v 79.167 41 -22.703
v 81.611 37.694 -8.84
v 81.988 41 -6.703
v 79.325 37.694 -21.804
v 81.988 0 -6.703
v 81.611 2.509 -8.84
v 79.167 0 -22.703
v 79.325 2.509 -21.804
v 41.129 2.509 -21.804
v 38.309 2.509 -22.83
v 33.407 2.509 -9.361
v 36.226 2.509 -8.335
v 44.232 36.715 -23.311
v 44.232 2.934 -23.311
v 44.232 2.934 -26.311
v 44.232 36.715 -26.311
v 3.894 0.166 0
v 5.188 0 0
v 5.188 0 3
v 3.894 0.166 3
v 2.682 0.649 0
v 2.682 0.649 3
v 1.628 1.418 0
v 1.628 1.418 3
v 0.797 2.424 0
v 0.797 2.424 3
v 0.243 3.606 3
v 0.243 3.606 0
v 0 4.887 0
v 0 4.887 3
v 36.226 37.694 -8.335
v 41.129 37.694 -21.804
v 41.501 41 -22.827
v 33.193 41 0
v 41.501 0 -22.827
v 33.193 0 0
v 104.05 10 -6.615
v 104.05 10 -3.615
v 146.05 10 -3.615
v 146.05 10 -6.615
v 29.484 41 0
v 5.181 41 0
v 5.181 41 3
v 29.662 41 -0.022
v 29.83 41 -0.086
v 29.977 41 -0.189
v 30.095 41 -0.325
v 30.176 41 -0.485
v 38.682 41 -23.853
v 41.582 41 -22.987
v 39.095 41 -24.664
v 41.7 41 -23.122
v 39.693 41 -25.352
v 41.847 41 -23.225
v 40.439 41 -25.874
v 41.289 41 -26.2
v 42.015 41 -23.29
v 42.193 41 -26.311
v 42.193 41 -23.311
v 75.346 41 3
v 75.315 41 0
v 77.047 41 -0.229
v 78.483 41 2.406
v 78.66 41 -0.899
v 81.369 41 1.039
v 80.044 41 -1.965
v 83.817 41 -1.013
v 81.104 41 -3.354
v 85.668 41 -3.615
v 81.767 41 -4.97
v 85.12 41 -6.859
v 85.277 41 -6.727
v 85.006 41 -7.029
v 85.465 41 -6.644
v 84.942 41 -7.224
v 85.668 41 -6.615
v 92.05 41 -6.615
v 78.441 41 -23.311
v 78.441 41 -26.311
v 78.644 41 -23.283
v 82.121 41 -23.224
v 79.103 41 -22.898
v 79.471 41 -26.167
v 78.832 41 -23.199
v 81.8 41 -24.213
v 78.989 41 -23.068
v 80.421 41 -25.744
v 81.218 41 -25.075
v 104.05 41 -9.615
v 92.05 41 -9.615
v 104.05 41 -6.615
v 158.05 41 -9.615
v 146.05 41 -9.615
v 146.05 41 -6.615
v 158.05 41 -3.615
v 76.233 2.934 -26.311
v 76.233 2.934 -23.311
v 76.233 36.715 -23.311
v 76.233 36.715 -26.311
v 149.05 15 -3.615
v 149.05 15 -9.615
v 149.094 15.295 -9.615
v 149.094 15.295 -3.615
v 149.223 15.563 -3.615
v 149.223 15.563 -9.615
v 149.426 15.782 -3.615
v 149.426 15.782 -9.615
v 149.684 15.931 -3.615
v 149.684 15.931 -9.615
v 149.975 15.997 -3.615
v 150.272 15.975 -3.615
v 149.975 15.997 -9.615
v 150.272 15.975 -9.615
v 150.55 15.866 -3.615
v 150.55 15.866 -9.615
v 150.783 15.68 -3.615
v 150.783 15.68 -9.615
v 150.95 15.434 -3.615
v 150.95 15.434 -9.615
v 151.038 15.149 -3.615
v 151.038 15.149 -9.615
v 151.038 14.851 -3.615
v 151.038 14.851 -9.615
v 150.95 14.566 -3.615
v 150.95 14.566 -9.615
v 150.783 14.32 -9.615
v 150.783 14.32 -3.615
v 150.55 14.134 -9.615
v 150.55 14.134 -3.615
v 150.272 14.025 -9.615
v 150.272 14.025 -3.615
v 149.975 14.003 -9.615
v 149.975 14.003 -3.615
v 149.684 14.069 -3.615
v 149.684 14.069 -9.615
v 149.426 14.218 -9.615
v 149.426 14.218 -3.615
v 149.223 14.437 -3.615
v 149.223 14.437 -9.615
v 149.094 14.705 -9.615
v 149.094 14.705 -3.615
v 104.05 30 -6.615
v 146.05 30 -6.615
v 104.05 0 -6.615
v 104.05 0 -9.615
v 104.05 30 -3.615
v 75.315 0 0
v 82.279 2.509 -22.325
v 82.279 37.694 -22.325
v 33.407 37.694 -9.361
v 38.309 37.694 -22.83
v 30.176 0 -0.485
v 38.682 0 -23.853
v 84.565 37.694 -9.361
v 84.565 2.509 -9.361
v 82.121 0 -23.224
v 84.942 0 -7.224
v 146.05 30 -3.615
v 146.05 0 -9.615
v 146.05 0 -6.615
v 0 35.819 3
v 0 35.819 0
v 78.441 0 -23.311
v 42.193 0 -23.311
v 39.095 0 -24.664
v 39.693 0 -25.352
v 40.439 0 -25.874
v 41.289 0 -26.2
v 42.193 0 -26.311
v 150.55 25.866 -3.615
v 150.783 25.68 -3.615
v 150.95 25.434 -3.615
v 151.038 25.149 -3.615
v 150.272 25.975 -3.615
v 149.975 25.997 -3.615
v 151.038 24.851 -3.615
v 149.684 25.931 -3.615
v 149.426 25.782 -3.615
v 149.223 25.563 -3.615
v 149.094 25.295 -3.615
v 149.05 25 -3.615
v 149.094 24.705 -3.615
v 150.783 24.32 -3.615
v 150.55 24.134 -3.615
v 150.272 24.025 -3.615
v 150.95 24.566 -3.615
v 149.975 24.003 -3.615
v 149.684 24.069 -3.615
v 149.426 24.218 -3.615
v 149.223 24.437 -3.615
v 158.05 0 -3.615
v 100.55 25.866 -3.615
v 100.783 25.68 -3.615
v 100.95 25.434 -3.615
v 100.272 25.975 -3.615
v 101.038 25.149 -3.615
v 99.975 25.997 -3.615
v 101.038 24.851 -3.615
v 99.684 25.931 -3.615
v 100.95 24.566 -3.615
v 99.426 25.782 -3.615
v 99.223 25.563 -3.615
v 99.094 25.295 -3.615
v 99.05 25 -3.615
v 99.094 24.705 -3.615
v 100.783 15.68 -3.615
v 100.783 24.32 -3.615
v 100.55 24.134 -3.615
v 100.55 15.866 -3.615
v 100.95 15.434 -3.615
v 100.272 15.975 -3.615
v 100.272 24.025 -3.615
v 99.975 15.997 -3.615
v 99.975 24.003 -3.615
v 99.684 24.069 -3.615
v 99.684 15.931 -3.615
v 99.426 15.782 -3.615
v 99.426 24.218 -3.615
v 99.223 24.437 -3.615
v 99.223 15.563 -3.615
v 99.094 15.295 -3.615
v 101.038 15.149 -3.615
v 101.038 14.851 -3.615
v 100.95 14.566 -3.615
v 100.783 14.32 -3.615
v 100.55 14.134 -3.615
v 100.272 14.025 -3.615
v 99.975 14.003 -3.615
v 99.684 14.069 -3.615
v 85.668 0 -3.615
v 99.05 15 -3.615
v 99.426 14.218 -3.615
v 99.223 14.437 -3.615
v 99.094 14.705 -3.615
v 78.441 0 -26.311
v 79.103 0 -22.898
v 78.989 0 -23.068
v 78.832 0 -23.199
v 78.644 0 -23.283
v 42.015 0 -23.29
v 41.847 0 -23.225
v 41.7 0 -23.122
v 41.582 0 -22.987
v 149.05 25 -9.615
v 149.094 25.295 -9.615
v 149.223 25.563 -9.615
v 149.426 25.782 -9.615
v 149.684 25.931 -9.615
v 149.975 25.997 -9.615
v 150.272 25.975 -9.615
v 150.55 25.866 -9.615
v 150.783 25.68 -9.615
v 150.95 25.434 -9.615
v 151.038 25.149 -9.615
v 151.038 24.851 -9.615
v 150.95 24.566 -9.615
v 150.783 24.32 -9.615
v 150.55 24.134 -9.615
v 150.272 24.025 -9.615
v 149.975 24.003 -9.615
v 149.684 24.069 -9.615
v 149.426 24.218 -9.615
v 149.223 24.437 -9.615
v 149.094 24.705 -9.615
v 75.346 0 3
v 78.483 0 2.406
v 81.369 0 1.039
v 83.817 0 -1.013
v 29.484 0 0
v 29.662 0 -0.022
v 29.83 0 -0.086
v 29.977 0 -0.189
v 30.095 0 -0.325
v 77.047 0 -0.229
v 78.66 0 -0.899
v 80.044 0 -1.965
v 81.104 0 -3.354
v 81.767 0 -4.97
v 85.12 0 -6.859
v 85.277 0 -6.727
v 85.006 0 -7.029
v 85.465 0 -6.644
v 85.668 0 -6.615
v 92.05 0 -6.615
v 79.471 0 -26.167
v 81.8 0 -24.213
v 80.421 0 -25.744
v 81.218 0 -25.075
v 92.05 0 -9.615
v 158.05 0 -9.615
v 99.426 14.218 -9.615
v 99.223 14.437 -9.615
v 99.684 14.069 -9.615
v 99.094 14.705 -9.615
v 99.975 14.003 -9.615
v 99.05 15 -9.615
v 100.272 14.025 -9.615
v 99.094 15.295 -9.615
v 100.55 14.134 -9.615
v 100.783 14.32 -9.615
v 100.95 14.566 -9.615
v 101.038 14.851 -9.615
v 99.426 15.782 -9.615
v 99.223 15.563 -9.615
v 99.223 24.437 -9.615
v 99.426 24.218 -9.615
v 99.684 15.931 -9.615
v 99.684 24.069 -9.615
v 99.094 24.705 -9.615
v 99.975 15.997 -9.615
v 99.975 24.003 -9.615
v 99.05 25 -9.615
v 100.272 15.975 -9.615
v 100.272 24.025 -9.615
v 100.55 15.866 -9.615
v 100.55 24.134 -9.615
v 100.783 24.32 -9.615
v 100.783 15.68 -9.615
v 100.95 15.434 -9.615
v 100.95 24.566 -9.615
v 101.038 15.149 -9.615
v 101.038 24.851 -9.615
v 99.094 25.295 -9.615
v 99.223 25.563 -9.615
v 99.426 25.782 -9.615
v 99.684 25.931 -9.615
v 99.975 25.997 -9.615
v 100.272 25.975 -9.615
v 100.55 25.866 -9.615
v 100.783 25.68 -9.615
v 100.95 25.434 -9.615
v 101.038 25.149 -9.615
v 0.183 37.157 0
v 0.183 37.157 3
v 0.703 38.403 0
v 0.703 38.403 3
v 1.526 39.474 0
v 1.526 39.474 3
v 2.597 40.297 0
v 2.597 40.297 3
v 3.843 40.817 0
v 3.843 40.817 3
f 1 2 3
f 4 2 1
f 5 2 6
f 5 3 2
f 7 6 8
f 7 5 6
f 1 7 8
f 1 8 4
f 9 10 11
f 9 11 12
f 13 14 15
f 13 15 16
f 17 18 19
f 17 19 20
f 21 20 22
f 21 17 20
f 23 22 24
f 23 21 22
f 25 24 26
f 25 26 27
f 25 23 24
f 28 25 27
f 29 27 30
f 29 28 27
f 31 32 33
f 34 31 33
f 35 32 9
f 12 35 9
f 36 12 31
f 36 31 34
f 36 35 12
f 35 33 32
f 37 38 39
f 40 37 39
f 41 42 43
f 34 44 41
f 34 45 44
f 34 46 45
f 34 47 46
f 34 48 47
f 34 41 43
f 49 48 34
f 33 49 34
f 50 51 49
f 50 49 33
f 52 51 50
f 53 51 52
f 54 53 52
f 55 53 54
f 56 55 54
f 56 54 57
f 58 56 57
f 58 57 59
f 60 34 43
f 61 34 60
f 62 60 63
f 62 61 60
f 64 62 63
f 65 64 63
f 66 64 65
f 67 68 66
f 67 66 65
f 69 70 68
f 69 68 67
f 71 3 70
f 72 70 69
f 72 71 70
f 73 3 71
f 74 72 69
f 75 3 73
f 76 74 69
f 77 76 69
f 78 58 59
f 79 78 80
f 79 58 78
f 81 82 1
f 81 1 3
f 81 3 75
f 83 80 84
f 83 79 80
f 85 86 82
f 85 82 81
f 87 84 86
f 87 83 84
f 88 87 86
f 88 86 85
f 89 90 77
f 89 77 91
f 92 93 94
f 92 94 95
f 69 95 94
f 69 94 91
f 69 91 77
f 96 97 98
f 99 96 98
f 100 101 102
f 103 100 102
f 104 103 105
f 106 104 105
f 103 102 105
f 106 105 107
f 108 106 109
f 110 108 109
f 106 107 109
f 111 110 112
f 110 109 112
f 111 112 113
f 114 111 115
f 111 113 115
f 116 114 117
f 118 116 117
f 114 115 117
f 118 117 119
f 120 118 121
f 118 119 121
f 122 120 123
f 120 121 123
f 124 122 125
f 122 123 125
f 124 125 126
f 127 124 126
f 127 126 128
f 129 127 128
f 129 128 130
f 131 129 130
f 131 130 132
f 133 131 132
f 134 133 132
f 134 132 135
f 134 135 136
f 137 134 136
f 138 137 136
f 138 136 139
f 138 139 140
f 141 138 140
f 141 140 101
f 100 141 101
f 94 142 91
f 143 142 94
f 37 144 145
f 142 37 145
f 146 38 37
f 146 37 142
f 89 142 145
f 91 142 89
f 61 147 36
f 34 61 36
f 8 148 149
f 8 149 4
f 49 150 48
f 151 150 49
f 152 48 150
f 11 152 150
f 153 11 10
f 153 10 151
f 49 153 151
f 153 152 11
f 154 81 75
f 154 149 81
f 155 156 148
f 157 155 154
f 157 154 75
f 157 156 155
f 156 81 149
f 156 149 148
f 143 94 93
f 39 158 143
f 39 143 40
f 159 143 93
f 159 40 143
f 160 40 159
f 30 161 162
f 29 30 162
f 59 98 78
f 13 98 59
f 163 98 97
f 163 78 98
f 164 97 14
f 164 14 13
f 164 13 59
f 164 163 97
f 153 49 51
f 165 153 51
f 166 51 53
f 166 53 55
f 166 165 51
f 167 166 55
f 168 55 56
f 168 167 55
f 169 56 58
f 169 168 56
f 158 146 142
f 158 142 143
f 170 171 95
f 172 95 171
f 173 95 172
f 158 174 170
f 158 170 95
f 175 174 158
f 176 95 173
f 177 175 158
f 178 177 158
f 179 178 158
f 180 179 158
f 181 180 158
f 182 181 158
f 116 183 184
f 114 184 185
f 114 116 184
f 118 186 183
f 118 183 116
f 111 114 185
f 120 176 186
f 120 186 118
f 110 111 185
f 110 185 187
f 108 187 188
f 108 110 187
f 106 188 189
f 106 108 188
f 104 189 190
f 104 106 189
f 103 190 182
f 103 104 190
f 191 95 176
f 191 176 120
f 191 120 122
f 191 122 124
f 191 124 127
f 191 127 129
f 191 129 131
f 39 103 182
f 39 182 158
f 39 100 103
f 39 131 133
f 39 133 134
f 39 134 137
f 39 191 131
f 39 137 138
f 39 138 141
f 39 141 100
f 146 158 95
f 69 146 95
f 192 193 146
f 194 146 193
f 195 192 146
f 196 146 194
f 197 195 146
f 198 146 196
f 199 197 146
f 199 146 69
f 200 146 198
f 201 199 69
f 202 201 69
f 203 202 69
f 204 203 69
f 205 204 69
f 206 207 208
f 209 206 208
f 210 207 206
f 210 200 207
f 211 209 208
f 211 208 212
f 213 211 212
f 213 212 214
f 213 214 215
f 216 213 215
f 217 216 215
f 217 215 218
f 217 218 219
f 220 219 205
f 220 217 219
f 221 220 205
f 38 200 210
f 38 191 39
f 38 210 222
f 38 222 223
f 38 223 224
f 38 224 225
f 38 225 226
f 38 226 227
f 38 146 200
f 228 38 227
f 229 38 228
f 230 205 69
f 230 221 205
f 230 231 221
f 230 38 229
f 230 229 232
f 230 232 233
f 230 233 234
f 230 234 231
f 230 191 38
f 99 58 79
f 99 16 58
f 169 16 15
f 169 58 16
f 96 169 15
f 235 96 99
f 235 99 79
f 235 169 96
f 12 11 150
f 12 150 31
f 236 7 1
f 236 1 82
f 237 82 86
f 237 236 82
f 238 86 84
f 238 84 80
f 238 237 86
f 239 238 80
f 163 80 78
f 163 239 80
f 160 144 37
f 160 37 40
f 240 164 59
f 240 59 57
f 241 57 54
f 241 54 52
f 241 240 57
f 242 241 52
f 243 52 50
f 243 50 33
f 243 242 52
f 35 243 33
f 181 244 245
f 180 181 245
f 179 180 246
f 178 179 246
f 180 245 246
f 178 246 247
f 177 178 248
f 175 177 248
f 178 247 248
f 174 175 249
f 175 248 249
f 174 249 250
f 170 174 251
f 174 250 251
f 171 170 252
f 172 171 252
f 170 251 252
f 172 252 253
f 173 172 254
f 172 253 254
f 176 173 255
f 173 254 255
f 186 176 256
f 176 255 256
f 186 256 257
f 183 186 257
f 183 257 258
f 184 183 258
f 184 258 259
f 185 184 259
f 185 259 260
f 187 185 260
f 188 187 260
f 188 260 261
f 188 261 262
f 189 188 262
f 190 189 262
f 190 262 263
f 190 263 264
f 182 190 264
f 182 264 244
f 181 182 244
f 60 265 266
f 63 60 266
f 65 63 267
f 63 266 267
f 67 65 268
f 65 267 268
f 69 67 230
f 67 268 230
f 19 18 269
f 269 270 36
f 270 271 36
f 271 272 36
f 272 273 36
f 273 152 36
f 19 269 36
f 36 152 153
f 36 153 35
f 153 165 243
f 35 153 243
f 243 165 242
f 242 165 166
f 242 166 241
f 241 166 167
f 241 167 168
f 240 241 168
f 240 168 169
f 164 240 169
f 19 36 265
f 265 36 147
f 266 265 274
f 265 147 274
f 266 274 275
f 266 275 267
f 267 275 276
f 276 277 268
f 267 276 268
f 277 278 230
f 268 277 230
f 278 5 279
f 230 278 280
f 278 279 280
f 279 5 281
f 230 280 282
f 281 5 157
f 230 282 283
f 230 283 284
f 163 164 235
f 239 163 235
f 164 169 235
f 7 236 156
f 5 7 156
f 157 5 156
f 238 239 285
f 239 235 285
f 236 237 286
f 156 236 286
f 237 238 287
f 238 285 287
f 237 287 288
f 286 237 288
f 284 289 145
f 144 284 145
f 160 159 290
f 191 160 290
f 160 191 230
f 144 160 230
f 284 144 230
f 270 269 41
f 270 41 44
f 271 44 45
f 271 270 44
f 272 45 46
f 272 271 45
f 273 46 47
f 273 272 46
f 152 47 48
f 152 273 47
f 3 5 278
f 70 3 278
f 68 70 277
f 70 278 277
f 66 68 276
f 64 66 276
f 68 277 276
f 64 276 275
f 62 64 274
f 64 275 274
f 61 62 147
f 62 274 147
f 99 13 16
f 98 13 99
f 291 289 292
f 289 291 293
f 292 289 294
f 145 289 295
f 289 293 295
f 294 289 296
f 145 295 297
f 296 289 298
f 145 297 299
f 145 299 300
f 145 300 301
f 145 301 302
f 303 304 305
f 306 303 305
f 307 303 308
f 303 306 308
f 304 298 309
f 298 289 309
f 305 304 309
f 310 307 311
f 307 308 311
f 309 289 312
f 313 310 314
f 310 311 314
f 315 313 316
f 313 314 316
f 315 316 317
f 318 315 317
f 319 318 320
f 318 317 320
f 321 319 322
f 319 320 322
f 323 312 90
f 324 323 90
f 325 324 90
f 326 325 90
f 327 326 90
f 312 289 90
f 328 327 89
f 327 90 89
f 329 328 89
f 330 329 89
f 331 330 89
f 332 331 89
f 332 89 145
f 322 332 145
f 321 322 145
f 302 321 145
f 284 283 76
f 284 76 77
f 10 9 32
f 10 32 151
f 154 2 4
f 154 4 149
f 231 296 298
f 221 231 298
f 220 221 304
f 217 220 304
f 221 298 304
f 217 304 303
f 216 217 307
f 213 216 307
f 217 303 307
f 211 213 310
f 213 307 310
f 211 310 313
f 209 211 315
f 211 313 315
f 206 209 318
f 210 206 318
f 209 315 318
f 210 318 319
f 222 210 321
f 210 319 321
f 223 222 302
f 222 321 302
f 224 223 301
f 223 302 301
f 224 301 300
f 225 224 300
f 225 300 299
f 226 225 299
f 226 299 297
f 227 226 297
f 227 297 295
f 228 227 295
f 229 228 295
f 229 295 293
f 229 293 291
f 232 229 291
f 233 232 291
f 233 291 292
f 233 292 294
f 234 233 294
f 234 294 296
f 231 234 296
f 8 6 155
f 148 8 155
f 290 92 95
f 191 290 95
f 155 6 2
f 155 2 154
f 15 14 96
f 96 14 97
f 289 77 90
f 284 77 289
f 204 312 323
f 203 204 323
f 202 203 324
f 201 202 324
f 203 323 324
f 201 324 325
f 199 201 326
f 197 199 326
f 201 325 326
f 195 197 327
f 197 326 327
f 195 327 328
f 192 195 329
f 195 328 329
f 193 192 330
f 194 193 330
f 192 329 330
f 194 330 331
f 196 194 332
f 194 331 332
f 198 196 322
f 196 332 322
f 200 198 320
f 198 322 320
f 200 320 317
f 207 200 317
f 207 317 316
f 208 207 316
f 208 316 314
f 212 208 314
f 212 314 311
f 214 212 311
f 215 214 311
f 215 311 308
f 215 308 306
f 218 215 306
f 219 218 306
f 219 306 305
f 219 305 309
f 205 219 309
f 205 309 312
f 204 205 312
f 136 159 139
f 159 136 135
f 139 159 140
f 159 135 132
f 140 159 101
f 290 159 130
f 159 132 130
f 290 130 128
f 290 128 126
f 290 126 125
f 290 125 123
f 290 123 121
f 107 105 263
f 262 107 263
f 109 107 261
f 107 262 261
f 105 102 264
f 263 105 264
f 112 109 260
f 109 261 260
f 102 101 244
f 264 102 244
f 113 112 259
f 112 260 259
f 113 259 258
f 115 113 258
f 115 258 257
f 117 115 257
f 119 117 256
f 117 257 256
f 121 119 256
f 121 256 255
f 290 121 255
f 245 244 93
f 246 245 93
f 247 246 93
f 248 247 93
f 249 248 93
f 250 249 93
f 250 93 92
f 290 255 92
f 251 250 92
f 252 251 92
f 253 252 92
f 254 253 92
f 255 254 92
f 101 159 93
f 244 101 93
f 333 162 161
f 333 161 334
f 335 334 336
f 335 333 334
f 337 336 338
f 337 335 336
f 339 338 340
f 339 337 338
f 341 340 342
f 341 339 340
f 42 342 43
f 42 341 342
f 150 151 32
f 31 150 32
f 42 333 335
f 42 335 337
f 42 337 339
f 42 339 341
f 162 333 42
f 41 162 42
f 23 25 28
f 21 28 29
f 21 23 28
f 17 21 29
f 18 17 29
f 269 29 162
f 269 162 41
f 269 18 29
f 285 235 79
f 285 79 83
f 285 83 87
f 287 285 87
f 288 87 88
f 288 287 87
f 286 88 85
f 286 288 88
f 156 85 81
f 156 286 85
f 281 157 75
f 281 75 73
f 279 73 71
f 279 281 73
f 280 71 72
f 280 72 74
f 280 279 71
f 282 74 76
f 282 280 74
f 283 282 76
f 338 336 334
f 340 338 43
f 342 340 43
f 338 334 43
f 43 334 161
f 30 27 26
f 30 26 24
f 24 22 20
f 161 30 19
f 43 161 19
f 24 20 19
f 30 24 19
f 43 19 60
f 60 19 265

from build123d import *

# Parameters (mm, degrees)
BASE_FLANGE1_DEPTH  = 41
SKETCH2_W           = 42
SKETCH2_H           = 20
CUT_EXTRUDE1_DEPTH  = 10
BOSS_EXTRUDE1_DEPTH = 6
SKETCH5_R           = 1
CUT_EXTRUDE3_DEPTH  = 165.132308696
BOSS_EXTRUDE2_DEPTH = 41
SKETCH7_W           = 32.001348433
SKETCH7_H           = 33.78132576
CUT_EXTRUDE4_DEPTH  = 7
CUT_EXTRUDE5_START  = 2.509016302
CUT_EXTRUDE5_DEPTH  = 35.18539121
CUT_EXTRUDE6_START  = -3
CUT_EXTRUDE6_DEPTH  = 3


# Read off the part's stored shape, not the designer's step: Cut-Extrude5, Cut-Extrude6
# Sheet-metal steps are written as plain solids
with BuildPart() as part:
    # Sketch1 → Base-Flange1 (new body)
    with BuildSketch(Plane(origin=(0, 0, 0), x_dir=(1, 0, 0), z_dir=(0, 1, 0))):
        with BuildLine():
            Line((0, 0), (29.484227127, 0))
            ThreePointArc((29.484227127, 0), (29.90672353, 0.133212604), (30.176404712, 0.484667962))
            Line((30.176404712, 0.484667962), (38.681704054, 23.85278585))
            ThreePointArc((38.681704054, 23.85278585), (40.049733788, 25.635636911), (42.1929595, 26.311393382))
            Line((42.1929595, 26.311393382), (78.441184331, 26.311393382))
            ThreePointArc((78.441184331, 26.311393382), (80.843024514, 25.437195048), (82.121016981, 23.223647163))
            Line((82.121016981, 23.223647163), (84.942198964, 7.223929074))
            ThreePointArc((84.942198964, 7.223929074), (85.194131001, 6.787569985), (85.667608355, 6.615238322))
            Line((85.667608355, 6.615238322), (158.049527566, 6.615238322))
            Line((158.049527566, 6.615238322), (158.049527566, 3.615238322))
            Line((158.049527566, 3.615238322), (85.667608355, 3.615238322))
            ThreePointArc((85.667608355, 3.615238322), (83.265768172, 4.489436656), (81.987775705, 6.702984541))
            Line((81.987775705, 6.702984541), (79.166593722, 22.70270263))
            ThreePointArc((79.166593722, 22.70270263), (78.914661685, 23.139061719), (78.441184331, 23.311393382))
            Line((78.441184331, 23.311393382), (42.1929595, 23.311393382))
            ThreePointArc((42.1929595, 23.311393382), (41.770463097, 23.178180778), (41.500781916, 22.82672542))
            Line((41.500781916, 22.82672542), (32.995482574, -0.541392468))
            ThreePointArc((32.995482574, -0.541392468), (31.627452839, -2.324243529), (29.484227127, -3))
            Line((29.484227127, -3), (0, -3))
            Line((0, -3), (0, 0))
        make_face()
    extrude(amount=BASE_FLANGE1_DEPTH)

    # Sketch2 → Cut-Extrude1 (cut)
    with BuildSketch(Plane.XY.offset(-3.615238322)):
        with Locations((125.049527566, 20)):
            Rectangle(SKETCH2_W, SKETCH2_H)
    extrude(amount=-CUT_EXTRUDE1_DEPTH, mode=Mode.SUBTRACT)

    # Sketch3 → Boss-Extrude1 (add)
    with BuildSketch(Plane.XY.offset(-3.615238322)):
        Polygon((104.049527566, 30), (104.049527566, 41), (92.049527566, 41), (92.049527566, 0), (104.049527566, 0), (104.049527566, 10), align=None)
        Polygon((158.049527566, 0), (158.049527566, 41), (146.049527566, 41), (146.049527566, 30), (146.049527566, 10), (146.049527566, 0), align=None)
    extrude(amount=-BOSS_EXTRUDE1_DEPTH)

    # Sketch5 → Cut-Extrude3 (cut, through all)
    with BuildSketch(Plane(origin=(0, 0, -9.615238322), x_dir=(-1, 0, 0), z_dir=(0, 0, -1))):
        with Locations((-100.049527566, 25)):
            Circle(SKETCH5_R)
        with Locations((-100.049527566, 15)):
            Circle(SKETCH5_R)
        with Locations((-150.049527566, 15)):
            Circle(SKETCH5_R)
        with Locations((-150.049527566, 25)):
            Circle(SKETCH5_R)
    extrude(amount=-CUT_EXTRUDE3_DEPTH, mode=Mode.SUBTRACT)

    # Sketch6 → Boss-Extrude2 (add)
    with BuildSketch(Plane(origin=(0, 0, 0), x_dir=(-1, 0, 0), z_dir=(0, -1, 0))):
        with BuildLine():
            Line((-29.484227127, -3), (-75.34551542, -3))
            ThreePointArc((-75.34551542, -3), (-81.36937718, -1.03867544), (-85.667608355, 3.615238322))
            ThreePointArc((-85.667608355, 3.615238322), (-83.265768172, 4.489436656), (-81.987775705, 6.702984541))
            ThreePointArc((-81.987775705, 6.702984541), (-80.044156462, 1.965108483), (-75.315152978, 0))
            Line((-75.315152978, 0), (-29.484227127, 0))
            Line((-29.484227127, 0), (-29.484227127, -3))
        make_face()
    extrude(amount=-BOSS_EXTRUDE2_DEPTH)

    # Sketch7 → Cut-Extrude4 (cut)
    with BuildSketch(Plane.XY.offset(-23.311393382)):
        with Locations((60.232231791, 19.824471405)):
            Rectangle(SKETCH7_W, SKETCH7_H)
    extrude(amount=-CUT_EXTRUDE4_DEPTH, mode=Mode.SUBTRACT)

    # Cut-Extrude5 outline → Cut-Extrude5 (cut)
    with BuildSketch(Plane(origin=(0, 0, 0), x_dir=(1, 0, 0), z_dir=(0, 1, 0)).offset(CUT_EXTRUDE5_START)):
        Polygon((84.565358052, 9.361100086), (82.279466997, 22.325032469), (79.325043738, 21.804087936), (81.610934793, 8.840155553), align=None)
        Polygon((38.309494449, 22.830148366), (33.407161792, 9.361100086), (36.226239654, 8.335039656), (41.128572311, 21.804087936), align=None)
    extrude(amount=CUT_EXTRUDE5_DEPTH, mode=Mode.SUBTRACT)

    # Cut-Extrude6 outline → Cut-Extrude6 (cut)
    with BuildSketch(Plane.XY.offset(3).offset(CUT_EXTRUDE6_START)):
        with BuildLine():
            ThreePointArc((5.188265578, 0), (1.627560559, 1.417661865), (0, 4.887450335))
            Line((0, 4.887450335), (0, 0))
            Line((0, 0), (5.188265578, 0))
        make_face()
        with BuildLine():
            ThreePointArc((0, 35.818729295), (1.526422616, 39.473577384), (5.181270705, 41))
            Line((5.181270705, 41), (0, 41))
            Line((0, 41), (0, 35.818729295))
        make_face()
    extrude(amount=CUT_EXTRUDE6_DEPTH, mode=Mode.SUBTRACT)


solid = part.part
